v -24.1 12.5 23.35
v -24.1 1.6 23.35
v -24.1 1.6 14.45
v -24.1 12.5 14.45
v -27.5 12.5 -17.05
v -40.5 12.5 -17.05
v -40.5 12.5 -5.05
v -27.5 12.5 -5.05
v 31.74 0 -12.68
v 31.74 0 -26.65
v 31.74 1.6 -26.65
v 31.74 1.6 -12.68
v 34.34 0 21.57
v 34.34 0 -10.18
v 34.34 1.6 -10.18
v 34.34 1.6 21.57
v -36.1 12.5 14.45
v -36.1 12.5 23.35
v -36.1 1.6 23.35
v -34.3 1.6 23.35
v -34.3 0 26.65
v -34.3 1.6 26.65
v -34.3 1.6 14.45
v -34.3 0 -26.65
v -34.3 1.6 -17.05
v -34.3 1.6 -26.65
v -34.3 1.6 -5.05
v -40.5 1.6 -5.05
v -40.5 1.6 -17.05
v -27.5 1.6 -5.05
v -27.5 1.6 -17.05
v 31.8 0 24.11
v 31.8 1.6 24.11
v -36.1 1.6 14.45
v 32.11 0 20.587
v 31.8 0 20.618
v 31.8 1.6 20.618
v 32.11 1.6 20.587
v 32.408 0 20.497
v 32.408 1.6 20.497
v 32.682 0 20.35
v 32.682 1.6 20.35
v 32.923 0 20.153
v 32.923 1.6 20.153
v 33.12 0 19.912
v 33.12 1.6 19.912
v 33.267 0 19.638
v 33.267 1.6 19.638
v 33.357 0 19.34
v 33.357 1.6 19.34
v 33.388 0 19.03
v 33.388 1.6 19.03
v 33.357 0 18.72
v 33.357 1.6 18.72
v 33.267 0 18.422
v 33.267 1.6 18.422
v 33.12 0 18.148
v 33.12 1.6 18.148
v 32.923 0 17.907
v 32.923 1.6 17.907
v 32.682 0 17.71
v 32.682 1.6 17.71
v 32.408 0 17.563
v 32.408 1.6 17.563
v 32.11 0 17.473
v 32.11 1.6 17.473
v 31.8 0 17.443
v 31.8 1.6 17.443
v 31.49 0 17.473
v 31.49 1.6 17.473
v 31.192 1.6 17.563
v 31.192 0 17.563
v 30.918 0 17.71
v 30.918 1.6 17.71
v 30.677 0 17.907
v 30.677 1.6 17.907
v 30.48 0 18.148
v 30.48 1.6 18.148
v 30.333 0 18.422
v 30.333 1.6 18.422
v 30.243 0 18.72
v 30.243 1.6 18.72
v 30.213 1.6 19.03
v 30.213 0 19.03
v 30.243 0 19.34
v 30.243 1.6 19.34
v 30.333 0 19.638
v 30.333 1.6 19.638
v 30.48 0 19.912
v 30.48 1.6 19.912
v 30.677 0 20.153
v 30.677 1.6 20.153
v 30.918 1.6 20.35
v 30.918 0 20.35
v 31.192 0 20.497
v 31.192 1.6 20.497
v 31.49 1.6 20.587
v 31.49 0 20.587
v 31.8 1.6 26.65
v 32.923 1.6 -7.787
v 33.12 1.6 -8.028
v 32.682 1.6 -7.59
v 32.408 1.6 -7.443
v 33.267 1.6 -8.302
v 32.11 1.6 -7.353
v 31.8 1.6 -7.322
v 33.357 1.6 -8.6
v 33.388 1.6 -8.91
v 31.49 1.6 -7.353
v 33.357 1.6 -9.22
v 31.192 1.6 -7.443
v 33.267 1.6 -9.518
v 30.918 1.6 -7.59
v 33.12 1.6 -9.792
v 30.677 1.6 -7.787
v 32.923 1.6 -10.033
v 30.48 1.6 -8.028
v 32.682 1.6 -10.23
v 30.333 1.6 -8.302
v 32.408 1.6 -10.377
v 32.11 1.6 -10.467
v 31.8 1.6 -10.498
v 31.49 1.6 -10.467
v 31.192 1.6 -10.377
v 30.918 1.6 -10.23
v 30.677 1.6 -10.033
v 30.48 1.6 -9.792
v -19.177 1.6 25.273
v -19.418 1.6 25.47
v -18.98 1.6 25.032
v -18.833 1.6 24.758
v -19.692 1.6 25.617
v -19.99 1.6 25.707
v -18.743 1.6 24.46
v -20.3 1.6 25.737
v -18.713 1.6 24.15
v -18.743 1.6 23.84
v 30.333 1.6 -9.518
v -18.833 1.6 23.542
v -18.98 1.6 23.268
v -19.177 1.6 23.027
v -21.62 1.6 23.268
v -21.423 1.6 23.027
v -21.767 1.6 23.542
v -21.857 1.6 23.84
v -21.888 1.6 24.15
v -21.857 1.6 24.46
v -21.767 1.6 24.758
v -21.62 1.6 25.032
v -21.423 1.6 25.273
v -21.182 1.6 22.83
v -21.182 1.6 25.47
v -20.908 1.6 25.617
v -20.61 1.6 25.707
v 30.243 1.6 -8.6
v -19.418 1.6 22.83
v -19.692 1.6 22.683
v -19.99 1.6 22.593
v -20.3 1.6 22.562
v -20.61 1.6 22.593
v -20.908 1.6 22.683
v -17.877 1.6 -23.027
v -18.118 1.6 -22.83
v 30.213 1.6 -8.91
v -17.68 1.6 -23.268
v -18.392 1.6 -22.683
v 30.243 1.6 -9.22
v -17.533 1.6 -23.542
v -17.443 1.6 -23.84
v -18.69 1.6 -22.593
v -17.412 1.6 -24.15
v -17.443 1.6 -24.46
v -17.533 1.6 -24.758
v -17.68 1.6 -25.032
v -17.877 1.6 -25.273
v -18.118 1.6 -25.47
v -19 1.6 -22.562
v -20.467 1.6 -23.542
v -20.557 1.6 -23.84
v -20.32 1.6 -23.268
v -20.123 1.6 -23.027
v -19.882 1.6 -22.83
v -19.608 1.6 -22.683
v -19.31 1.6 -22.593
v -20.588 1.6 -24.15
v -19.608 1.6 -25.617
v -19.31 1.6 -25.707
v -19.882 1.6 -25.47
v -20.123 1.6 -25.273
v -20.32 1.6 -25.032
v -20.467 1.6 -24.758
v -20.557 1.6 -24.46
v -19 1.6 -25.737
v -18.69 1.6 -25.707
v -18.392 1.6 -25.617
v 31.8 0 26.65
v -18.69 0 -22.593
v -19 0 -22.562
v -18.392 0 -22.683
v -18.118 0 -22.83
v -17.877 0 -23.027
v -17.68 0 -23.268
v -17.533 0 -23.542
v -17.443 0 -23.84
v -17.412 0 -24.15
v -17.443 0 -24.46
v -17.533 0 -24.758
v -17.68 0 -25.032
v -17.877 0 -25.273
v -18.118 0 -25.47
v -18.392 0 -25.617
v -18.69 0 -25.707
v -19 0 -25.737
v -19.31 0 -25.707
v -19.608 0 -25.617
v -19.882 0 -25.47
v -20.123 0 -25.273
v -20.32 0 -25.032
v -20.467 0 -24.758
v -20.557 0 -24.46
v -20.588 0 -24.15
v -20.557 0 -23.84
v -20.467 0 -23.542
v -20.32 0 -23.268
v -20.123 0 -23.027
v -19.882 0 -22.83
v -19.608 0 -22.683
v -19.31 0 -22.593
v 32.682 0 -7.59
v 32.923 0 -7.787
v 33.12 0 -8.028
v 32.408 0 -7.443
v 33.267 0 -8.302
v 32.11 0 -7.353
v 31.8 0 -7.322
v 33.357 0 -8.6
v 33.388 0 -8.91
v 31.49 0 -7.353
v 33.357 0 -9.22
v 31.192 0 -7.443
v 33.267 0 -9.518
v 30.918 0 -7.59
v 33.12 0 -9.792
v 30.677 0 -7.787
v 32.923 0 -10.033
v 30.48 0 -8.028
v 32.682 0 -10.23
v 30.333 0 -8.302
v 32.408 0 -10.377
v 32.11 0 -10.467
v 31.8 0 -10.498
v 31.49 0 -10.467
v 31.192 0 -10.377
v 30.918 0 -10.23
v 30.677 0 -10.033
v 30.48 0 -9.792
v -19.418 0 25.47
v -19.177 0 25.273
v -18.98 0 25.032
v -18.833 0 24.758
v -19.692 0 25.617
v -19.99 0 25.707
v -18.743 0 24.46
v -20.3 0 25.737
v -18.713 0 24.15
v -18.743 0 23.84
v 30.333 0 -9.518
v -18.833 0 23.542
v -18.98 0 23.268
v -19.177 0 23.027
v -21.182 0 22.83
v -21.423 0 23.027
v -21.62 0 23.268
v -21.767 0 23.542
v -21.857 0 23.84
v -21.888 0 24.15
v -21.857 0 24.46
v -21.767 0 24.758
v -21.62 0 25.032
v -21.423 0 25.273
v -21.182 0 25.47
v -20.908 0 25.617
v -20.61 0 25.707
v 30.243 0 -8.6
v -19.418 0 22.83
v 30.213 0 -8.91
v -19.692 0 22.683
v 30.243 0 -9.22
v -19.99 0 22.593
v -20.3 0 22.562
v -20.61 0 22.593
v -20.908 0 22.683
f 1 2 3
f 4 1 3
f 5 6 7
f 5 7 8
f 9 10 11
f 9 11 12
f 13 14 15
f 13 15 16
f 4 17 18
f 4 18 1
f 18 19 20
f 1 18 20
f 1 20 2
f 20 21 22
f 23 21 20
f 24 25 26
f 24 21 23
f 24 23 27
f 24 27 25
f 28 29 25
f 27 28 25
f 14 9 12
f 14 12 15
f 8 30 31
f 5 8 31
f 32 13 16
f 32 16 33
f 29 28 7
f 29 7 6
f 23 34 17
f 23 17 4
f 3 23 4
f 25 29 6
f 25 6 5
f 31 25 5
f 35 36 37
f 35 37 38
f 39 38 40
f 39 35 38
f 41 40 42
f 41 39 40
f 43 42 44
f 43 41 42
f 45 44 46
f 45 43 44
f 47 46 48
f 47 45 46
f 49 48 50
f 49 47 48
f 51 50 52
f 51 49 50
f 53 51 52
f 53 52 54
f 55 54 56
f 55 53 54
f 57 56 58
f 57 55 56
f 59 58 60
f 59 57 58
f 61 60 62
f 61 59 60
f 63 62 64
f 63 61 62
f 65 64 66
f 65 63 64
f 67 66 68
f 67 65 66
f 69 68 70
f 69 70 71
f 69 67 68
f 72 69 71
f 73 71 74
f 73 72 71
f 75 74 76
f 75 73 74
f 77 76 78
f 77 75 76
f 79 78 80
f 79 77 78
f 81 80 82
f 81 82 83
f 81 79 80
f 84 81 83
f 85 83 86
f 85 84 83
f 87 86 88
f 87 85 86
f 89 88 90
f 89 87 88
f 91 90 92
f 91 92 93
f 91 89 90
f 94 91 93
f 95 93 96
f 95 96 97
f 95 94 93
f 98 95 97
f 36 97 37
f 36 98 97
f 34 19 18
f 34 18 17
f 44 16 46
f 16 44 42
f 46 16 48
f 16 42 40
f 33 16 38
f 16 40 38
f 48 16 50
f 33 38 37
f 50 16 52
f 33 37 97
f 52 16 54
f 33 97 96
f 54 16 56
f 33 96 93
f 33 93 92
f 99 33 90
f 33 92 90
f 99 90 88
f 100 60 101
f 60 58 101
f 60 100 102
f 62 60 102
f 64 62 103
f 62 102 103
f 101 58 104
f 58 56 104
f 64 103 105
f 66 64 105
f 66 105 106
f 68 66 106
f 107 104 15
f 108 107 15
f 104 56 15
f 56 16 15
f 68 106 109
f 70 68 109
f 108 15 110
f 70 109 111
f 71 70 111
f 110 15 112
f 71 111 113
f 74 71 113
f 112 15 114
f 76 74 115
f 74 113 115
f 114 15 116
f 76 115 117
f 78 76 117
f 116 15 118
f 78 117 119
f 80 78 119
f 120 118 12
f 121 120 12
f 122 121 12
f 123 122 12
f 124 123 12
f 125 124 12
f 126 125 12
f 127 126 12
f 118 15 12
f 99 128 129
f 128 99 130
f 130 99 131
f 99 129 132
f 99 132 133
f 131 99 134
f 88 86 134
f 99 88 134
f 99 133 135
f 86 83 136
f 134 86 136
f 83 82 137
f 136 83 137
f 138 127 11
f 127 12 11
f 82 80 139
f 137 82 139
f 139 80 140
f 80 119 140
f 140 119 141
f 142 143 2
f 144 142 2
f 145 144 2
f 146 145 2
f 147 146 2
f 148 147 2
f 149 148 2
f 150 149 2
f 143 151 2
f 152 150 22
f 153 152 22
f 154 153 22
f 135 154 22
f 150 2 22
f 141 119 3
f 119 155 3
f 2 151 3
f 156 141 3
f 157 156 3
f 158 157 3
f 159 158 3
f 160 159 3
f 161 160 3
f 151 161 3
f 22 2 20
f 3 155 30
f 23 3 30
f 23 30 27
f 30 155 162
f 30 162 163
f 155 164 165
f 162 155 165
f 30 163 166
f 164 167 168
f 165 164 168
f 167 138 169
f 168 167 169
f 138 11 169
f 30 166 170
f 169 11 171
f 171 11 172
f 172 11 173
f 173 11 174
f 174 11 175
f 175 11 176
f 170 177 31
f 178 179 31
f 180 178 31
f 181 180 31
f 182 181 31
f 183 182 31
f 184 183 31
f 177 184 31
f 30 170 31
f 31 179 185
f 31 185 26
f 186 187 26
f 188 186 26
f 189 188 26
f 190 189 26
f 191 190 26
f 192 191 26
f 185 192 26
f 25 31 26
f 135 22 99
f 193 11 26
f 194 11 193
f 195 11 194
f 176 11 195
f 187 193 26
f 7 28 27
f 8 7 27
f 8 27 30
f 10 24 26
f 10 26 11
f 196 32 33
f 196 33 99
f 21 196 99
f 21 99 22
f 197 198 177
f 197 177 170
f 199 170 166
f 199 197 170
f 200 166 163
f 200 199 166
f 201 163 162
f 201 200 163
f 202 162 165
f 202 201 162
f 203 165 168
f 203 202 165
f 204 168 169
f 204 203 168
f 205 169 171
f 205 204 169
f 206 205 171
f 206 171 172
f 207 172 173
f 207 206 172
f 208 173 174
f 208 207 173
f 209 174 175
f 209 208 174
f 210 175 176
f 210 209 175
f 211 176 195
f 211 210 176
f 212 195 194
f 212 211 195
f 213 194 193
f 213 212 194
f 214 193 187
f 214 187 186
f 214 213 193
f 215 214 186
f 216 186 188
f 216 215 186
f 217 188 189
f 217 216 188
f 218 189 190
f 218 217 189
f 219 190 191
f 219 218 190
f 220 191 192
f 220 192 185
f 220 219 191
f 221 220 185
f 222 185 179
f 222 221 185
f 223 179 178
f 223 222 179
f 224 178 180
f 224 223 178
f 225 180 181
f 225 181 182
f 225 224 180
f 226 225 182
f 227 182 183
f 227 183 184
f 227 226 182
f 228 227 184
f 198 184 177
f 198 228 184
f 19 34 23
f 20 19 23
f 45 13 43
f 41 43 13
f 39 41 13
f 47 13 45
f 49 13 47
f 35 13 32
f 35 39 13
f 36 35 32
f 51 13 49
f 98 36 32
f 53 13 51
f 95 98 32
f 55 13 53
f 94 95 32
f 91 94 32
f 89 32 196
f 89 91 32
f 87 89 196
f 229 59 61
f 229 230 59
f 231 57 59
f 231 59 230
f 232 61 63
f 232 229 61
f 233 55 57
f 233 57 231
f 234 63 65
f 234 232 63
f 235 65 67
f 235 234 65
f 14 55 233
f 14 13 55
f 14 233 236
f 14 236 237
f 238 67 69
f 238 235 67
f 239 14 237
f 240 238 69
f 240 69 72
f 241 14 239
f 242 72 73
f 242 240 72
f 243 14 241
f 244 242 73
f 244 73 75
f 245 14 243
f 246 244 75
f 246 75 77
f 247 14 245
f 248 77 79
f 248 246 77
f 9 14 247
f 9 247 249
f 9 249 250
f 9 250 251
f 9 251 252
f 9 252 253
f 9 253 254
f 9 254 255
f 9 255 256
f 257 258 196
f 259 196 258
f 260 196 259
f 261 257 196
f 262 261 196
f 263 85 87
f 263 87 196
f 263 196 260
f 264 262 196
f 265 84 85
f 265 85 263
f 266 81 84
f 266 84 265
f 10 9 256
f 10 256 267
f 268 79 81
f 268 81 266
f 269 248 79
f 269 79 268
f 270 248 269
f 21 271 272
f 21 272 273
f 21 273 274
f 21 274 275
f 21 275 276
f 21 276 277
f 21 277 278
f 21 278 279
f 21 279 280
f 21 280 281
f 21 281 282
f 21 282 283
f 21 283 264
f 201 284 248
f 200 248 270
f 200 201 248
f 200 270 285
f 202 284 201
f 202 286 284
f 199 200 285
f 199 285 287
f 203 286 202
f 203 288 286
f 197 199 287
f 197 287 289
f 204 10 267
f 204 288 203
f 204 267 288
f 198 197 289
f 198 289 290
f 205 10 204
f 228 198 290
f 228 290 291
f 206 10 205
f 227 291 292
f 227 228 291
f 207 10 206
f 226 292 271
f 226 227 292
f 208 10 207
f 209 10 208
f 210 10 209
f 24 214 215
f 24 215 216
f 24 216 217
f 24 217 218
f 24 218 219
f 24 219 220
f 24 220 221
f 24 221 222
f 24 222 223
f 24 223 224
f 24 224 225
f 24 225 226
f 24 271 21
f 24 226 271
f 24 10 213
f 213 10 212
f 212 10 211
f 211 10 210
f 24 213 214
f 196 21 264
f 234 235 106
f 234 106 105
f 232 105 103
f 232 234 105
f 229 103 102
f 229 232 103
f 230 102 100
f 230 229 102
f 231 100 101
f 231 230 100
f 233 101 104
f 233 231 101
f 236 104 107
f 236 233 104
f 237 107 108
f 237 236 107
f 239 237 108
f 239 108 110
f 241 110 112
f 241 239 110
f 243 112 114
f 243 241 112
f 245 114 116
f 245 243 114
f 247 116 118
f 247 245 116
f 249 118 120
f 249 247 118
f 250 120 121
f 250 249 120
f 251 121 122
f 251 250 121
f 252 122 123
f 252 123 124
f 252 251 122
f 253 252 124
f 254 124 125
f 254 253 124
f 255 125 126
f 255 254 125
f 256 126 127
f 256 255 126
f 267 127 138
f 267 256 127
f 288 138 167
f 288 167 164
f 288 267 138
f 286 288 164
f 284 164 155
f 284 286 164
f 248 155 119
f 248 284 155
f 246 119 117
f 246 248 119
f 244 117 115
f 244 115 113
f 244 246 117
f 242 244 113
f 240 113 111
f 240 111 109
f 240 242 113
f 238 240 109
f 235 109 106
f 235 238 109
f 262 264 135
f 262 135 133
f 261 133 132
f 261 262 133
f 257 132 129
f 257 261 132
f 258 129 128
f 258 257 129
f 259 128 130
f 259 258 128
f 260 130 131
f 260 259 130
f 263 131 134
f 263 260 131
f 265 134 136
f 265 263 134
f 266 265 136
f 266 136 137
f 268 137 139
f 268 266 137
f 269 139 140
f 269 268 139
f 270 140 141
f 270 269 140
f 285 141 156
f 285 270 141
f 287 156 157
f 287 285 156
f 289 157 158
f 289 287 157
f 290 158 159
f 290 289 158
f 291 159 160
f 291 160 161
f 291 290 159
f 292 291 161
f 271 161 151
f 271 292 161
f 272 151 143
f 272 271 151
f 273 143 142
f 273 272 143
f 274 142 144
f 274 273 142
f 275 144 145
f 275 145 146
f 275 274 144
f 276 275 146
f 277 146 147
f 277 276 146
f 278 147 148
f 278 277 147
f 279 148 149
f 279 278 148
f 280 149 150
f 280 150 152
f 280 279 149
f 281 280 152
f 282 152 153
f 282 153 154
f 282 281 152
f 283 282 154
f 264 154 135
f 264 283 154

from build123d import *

# Parameters (mm, degrees)
SKETCH1_R           = 1.5875
BOSS_EXTRUDE1_DEPTH = 1.6
SKETCH2_W           = 12
SKETCH2_H           = 8.9
SKETCH2_W_2         = 13
SKETCH2_H_2         = 12
BOSS_EXTRUDE2_DEPTH = 10.9


with BuildPart() as part:
    # Sketch1 → Boss-Extrude1 (new body)
    with BuildSketch(Plane(origin=(0, 0, 0), x_dir=(1, 0, 0), z_dir=(0, 1, 0))):
        Polygon((-34.3, -26.65), (-34.3, 26.65), (31.74, 26.65), (31.74, 12.68), (34.34, 10.18), (34.34, -21.57), (31.8, -24.11), (31.8, -26.65), align=None)
        with Locations(Location((-19, 24.15, 0), (0, 0, 270))):
            Circle(SKETCH1_R, mode=Mode.SUBTRACT)
        with Locations(Location((-20.3, -24.15, 0), (0, 0, 270))):
            Circle(SKETCH1_R, mode=Mode.SUBTRACT)
        with Locations(Location((31.8, 8.91, 0), (0, 0, 270))):
            Circle(SKETCH1_R, mode=Mode.SUBTRACT)
        with Locations(Location((31.8, -19.03, 0), (0, 0, 270))):
            Circle(SKETCH1_R, mode=Mode.SUBTRACT)
    extrude(amount=BOSS_EXTRUDE1_DEPTH)

    # Sketch2 → Boss-Extrude2 (add)
    with BuildSketch(Plane(origin=(0, 1.6, 0), x_dir=(1, 0, 0), z_dir=(0, 1, 0))):
        with Locations((-30.1, -18.9)):
            Rectangle(SKETCH2_W, SKETCH2_H)
        with Locations((-34, 11.05)):
            Rectangle(SKETCH2_W_2, SKETCH2_H_2)
    extrude(amount=BOSS_EXTRUDE2_DEPTH)


solid = part.part
